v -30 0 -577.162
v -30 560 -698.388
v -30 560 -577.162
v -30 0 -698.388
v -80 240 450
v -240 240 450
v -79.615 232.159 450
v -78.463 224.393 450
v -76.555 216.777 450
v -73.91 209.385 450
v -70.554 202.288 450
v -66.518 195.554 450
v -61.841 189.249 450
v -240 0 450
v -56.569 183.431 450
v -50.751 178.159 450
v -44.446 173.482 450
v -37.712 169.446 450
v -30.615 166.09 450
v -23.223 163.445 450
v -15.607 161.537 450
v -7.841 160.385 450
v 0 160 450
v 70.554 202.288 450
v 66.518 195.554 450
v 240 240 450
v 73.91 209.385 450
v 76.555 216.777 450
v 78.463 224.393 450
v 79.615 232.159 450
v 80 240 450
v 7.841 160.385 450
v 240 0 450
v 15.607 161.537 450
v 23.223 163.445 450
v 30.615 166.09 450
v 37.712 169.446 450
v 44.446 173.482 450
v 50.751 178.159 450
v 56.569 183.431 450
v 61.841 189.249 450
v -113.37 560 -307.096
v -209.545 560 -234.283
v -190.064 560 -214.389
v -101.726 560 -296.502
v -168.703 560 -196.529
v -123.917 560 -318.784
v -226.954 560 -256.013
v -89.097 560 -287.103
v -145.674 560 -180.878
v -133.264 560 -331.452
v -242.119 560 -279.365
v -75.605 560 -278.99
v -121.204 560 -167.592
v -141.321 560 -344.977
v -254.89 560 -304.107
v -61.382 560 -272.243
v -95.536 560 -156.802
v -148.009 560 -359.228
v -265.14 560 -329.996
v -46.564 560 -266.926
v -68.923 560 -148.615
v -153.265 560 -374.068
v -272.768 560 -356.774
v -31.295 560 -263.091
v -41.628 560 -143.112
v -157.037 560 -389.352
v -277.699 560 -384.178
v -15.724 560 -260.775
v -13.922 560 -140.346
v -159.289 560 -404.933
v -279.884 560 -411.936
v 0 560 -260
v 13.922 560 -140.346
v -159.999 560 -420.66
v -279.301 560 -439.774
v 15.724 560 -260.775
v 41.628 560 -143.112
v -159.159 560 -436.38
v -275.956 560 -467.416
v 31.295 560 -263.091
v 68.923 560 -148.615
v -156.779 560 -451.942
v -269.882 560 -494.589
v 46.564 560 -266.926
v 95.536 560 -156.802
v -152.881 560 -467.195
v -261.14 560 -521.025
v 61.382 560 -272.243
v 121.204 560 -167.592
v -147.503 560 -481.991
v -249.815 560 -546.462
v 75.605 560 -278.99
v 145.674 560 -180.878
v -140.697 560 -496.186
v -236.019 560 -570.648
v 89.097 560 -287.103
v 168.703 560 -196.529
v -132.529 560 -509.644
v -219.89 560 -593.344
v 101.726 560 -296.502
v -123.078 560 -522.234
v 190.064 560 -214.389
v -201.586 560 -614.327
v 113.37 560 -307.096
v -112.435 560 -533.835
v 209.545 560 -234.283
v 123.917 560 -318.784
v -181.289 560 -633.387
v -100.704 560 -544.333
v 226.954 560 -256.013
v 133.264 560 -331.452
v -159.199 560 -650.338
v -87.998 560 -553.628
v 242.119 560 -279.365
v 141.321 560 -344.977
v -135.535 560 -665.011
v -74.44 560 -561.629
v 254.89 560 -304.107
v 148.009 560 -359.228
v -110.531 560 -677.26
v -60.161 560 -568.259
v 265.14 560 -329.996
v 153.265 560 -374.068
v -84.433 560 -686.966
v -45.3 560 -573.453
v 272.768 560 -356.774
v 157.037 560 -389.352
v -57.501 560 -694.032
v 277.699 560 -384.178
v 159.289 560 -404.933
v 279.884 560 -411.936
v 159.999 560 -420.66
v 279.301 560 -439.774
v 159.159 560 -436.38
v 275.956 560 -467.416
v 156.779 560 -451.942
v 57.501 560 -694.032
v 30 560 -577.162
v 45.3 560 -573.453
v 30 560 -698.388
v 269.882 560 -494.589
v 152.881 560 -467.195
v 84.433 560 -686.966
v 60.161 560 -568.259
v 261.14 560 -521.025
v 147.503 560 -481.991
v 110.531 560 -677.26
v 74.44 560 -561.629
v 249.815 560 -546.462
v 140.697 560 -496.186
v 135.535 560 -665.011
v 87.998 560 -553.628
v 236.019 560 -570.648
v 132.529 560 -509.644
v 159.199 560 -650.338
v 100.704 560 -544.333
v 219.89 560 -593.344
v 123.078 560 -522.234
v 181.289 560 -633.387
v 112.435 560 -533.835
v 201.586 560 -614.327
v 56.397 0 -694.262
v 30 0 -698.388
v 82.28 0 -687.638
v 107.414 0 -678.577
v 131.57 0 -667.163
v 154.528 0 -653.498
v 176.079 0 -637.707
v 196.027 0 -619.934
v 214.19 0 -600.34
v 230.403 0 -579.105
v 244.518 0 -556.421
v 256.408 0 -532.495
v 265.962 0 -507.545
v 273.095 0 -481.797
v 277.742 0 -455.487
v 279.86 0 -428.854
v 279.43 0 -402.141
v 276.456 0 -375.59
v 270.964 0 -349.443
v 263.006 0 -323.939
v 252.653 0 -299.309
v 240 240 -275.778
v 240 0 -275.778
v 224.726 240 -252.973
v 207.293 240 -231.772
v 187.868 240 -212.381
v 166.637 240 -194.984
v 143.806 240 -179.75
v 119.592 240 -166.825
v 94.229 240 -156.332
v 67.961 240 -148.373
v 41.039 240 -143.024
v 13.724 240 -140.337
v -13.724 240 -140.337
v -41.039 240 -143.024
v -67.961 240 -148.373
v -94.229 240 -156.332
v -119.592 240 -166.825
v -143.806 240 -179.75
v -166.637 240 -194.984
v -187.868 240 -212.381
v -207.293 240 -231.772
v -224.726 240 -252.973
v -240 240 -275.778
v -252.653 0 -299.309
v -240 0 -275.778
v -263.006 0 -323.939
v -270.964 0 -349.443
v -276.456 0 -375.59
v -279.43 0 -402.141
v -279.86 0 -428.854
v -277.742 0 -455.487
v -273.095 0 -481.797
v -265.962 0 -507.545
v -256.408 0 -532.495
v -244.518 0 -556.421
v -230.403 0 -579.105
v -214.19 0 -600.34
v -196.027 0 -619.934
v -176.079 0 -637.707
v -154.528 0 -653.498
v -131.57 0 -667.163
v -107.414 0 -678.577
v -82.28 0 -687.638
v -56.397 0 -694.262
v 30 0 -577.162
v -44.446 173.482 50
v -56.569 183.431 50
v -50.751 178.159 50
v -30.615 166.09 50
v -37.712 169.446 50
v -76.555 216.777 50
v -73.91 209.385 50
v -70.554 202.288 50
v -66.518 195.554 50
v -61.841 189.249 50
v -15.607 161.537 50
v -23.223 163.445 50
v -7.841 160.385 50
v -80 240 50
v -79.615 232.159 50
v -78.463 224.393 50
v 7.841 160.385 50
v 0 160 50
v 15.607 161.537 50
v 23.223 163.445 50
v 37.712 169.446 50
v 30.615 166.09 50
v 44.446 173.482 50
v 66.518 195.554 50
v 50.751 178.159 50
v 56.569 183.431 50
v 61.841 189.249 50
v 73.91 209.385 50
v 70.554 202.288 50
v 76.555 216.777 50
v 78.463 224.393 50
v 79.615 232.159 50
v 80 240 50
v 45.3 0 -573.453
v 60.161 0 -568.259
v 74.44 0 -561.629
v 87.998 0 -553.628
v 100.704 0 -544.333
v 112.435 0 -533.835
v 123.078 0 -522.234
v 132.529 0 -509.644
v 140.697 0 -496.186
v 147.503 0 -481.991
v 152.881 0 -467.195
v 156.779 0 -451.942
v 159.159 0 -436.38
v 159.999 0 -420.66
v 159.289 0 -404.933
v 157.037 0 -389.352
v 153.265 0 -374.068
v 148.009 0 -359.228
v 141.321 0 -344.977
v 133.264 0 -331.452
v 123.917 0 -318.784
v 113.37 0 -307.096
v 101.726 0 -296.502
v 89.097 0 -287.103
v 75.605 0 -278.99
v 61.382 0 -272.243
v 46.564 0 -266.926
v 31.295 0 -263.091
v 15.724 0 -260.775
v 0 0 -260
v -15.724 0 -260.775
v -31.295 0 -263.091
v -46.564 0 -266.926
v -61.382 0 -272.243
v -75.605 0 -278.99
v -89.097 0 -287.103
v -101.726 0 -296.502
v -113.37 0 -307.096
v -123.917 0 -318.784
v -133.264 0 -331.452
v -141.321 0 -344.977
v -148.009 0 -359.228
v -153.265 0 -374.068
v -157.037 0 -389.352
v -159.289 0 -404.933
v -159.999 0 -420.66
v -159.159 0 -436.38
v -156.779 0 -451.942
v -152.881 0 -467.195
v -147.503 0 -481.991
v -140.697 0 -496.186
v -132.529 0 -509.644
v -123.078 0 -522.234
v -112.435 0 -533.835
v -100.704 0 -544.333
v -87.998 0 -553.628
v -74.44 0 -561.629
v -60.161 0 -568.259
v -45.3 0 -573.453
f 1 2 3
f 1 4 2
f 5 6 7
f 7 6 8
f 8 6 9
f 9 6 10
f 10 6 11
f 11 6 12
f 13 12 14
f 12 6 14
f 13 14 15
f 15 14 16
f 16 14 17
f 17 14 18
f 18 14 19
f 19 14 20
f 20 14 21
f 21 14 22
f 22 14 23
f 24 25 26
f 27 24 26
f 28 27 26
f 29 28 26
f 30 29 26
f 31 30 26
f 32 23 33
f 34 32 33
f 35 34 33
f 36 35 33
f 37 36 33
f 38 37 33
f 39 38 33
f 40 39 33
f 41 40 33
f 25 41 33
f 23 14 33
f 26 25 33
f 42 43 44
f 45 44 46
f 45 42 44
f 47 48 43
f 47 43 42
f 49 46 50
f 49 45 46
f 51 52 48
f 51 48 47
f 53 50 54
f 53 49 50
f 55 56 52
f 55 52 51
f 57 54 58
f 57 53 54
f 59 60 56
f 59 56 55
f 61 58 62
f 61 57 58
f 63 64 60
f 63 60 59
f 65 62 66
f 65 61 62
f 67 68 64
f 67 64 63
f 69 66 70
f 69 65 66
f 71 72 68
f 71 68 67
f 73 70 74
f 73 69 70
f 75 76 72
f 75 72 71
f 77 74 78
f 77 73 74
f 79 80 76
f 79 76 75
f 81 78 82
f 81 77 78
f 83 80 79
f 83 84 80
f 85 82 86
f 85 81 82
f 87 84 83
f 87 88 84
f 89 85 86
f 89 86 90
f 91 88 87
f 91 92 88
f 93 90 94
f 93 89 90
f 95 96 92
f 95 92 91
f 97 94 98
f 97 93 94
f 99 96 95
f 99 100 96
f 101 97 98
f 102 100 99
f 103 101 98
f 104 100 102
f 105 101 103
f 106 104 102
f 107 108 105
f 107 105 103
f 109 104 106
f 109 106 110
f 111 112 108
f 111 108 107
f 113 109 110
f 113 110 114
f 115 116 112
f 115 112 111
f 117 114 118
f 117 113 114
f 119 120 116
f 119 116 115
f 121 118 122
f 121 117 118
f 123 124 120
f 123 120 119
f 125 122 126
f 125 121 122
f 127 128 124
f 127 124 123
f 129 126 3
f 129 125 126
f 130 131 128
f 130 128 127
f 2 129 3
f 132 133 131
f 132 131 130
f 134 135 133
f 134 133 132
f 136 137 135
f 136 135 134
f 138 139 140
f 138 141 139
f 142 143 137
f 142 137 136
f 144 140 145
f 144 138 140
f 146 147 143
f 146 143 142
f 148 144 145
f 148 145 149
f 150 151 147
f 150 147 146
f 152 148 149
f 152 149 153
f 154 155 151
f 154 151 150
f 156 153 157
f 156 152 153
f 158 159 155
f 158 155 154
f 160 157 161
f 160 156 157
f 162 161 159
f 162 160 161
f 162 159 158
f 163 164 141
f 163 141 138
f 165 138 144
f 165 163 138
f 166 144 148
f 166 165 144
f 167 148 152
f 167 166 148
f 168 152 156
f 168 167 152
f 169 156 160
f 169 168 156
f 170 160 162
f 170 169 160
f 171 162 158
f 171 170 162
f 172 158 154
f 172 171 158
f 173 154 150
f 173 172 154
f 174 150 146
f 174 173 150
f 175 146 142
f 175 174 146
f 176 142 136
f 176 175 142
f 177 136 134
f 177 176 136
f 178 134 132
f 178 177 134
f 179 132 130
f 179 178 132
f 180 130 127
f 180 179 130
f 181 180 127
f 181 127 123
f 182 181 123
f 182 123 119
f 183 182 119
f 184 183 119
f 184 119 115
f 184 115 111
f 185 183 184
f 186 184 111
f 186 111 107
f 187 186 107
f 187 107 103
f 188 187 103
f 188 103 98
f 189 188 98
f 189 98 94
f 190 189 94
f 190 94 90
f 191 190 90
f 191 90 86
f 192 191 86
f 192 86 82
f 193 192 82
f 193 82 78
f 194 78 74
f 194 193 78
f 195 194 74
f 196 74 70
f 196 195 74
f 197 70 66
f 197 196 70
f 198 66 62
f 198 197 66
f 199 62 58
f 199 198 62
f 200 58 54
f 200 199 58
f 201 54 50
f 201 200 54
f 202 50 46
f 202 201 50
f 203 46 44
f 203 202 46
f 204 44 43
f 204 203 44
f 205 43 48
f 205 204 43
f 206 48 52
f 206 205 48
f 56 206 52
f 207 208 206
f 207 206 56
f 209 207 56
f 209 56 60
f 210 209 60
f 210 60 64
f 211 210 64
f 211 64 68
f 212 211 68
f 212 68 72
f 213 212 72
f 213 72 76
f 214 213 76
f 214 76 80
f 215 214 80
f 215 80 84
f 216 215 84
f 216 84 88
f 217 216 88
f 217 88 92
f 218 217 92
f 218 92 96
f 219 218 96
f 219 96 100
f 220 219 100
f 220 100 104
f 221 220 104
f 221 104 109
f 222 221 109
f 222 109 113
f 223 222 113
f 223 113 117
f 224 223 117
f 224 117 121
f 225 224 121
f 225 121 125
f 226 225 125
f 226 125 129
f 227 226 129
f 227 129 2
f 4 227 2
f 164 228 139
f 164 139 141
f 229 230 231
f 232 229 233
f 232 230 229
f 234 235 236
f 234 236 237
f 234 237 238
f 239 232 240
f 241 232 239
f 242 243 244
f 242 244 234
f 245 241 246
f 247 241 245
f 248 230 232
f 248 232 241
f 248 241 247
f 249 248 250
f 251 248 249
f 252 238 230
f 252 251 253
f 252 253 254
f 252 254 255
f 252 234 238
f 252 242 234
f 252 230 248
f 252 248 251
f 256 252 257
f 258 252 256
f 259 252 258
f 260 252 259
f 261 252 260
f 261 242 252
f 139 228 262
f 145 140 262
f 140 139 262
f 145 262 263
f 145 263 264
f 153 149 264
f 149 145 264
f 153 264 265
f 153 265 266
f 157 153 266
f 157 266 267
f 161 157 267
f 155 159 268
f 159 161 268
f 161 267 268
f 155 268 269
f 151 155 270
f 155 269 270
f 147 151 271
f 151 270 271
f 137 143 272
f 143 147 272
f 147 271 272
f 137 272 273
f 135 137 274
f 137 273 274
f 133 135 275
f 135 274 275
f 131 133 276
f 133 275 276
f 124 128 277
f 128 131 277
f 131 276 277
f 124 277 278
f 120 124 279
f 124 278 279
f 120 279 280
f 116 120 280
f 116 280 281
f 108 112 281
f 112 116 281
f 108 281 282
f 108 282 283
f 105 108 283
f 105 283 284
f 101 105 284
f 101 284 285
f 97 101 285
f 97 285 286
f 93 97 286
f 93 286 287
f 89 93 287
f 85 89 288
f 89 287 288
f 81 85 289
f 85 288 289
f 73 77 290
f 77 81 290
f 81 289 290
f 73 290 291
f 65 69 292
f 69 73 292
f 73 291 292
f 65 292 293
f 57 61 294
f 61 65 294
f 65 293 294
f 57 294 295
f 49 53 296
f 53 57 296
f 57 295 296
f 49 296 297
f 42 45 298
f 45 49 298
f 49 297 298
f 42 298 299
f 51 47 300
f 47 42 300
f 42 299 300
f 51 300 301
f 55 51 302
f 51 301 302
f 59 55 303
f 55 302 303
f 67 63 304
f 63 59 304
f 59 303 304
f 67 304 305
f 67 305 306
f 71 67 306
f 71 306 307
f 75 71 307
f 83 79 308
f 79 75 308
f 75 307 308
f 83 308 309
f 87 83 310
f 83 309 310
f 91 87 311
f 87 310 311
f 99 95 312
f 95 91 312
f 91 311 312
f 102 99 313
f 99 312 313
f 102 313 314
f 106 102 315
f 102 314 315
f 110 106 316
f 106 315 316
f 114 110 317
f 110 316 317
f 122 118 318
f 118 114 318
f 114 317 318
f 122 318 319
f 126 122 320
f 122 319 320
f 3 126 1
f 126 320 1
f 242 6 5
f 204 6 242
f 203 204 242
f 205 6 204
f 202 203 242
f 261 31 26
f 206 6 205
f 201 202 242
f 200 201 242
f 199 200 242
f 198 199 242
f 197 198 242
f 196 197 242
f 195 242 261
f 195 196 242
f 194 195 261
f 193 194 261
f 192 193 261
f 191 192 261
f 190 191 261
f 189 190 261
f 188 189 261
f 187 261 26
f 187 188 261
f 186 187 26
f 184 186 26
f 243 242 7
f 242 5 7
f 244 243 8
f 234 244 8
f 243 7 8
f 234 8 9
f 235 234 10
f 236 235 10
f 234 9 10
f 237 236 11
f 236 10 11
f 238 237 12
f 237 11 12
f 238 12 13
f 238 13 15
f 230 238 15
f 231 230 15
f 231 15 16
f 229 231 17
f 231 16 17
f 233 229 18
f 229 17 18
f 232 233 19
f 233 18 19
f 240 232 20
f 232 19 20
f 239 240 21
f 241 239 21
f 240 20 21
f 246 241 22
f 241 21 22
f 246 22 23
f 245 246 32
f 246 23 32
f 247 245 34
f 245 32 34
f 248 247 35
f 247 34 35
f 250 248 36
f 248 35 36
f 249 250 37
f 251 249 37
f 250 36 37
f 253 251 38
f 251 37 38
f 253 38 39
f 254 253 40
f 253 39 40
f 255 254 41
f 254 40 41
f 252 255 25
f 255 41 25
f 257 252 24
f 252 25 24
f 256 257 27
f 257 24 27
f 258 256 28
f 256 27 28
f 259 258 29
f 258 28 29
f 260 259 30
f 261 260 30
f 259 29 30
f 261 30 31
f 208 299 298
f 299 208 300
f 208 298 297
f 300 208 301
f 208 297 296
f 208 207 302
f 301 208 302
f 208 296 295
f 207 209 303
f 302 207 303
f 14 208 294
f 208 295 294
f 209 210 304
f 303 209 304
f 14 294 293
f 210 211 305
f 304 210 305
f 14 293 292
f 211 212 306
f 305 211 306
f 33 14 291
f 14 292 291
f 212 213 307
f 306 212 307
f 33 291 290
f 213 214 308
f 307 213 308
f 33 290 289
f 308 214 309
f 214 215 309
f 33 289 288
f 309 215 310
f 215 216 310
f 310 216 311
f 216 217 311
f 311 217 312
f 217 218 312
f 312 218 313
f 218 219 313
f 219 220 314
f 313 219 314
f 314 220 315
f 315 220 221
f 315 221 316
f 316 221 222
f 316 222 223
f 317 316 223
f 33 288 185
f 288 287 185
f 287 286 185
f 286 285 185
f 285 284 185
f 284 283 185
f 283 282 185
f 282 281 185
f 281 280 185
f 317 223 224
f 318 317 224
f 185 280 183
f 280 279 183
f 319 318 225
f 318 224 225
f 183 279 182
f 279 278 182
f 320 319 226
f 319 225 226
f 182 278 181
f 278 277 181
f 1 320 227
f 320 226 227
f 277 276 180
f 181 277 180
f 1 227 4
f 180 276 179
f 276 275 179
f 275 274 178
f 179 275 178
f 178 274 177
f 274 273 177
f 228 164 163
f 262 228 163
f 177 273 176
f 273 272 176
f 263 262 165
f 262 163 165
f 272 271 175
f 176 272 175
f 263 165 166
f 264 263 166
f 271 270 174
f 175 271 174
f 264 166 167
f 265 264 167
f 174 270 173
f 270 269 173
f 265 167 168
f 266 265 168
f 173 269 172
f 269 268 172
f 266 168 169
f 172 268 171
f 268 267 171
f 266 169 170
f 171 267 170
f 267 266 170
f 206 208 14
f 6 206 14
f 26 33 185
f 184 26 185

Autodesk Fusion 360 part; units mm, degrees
sketch "Sketch1" plane through (0, 0, 0) normal (0, 1, 0) x (1, 0, 0)
  line L0 (-240, 275.7779) -> (-240, -450)
  line L1 (-240, -450) -> (240, -450)
  line L2 (240, -450) -> (240, 275.7779)
  line L3 (240, 450) -> (-240, -450) construction
  line L4 (-240, 450) -> (240, -450) construction
  line L5 (30, 577.1623) -> (30, 698.3882)
  line L6 (-30, 698.3882) -> (-30, 577.1623)
  arc A0 (-30, 698.3882) -> (30, 698.3882) centre (0, 420) ccw
  arc A1 (-30, 577.1623) -> (30, 577.1623) centre (0, 420) ccw
  dimension "d1" = 480
  dimension "d2" = 900
  dimension "d3" = 560
  dimension "d4" = 420
  dimension "d5" = 320
extrude "Extrude1" add sketch "Sketch1" along normal blind 560 contours L5 L6 A0 A1 makes body 1
extrude "Extrude2" add sketch "Sketch1" along normal blind 240 separate body contours L0 L1 L2 A0 makes body 2
sketch "Sketch2" plane through (0, 0, 450) normal (0, 0, 1) x (1, 0, 0)
  line L0 (-240, 0) -> (240, 0)
  line L1 (240, 0) -> (240, 240)
  line L2 (240, 240) -> (-240, 240)
  line L3 (-240, 240) -> (-240, 0)
  circle A0 centre (0, 240) radius 80
  dimension "d12" = 160
extrude "Extrude3" cut sketch "Sketch2" against normal blind 400 contours L2 A0 picked at (-9.7424, 215.1767) bodies 2
combine "Combine1" operation add target body 1 tool bodies 2
